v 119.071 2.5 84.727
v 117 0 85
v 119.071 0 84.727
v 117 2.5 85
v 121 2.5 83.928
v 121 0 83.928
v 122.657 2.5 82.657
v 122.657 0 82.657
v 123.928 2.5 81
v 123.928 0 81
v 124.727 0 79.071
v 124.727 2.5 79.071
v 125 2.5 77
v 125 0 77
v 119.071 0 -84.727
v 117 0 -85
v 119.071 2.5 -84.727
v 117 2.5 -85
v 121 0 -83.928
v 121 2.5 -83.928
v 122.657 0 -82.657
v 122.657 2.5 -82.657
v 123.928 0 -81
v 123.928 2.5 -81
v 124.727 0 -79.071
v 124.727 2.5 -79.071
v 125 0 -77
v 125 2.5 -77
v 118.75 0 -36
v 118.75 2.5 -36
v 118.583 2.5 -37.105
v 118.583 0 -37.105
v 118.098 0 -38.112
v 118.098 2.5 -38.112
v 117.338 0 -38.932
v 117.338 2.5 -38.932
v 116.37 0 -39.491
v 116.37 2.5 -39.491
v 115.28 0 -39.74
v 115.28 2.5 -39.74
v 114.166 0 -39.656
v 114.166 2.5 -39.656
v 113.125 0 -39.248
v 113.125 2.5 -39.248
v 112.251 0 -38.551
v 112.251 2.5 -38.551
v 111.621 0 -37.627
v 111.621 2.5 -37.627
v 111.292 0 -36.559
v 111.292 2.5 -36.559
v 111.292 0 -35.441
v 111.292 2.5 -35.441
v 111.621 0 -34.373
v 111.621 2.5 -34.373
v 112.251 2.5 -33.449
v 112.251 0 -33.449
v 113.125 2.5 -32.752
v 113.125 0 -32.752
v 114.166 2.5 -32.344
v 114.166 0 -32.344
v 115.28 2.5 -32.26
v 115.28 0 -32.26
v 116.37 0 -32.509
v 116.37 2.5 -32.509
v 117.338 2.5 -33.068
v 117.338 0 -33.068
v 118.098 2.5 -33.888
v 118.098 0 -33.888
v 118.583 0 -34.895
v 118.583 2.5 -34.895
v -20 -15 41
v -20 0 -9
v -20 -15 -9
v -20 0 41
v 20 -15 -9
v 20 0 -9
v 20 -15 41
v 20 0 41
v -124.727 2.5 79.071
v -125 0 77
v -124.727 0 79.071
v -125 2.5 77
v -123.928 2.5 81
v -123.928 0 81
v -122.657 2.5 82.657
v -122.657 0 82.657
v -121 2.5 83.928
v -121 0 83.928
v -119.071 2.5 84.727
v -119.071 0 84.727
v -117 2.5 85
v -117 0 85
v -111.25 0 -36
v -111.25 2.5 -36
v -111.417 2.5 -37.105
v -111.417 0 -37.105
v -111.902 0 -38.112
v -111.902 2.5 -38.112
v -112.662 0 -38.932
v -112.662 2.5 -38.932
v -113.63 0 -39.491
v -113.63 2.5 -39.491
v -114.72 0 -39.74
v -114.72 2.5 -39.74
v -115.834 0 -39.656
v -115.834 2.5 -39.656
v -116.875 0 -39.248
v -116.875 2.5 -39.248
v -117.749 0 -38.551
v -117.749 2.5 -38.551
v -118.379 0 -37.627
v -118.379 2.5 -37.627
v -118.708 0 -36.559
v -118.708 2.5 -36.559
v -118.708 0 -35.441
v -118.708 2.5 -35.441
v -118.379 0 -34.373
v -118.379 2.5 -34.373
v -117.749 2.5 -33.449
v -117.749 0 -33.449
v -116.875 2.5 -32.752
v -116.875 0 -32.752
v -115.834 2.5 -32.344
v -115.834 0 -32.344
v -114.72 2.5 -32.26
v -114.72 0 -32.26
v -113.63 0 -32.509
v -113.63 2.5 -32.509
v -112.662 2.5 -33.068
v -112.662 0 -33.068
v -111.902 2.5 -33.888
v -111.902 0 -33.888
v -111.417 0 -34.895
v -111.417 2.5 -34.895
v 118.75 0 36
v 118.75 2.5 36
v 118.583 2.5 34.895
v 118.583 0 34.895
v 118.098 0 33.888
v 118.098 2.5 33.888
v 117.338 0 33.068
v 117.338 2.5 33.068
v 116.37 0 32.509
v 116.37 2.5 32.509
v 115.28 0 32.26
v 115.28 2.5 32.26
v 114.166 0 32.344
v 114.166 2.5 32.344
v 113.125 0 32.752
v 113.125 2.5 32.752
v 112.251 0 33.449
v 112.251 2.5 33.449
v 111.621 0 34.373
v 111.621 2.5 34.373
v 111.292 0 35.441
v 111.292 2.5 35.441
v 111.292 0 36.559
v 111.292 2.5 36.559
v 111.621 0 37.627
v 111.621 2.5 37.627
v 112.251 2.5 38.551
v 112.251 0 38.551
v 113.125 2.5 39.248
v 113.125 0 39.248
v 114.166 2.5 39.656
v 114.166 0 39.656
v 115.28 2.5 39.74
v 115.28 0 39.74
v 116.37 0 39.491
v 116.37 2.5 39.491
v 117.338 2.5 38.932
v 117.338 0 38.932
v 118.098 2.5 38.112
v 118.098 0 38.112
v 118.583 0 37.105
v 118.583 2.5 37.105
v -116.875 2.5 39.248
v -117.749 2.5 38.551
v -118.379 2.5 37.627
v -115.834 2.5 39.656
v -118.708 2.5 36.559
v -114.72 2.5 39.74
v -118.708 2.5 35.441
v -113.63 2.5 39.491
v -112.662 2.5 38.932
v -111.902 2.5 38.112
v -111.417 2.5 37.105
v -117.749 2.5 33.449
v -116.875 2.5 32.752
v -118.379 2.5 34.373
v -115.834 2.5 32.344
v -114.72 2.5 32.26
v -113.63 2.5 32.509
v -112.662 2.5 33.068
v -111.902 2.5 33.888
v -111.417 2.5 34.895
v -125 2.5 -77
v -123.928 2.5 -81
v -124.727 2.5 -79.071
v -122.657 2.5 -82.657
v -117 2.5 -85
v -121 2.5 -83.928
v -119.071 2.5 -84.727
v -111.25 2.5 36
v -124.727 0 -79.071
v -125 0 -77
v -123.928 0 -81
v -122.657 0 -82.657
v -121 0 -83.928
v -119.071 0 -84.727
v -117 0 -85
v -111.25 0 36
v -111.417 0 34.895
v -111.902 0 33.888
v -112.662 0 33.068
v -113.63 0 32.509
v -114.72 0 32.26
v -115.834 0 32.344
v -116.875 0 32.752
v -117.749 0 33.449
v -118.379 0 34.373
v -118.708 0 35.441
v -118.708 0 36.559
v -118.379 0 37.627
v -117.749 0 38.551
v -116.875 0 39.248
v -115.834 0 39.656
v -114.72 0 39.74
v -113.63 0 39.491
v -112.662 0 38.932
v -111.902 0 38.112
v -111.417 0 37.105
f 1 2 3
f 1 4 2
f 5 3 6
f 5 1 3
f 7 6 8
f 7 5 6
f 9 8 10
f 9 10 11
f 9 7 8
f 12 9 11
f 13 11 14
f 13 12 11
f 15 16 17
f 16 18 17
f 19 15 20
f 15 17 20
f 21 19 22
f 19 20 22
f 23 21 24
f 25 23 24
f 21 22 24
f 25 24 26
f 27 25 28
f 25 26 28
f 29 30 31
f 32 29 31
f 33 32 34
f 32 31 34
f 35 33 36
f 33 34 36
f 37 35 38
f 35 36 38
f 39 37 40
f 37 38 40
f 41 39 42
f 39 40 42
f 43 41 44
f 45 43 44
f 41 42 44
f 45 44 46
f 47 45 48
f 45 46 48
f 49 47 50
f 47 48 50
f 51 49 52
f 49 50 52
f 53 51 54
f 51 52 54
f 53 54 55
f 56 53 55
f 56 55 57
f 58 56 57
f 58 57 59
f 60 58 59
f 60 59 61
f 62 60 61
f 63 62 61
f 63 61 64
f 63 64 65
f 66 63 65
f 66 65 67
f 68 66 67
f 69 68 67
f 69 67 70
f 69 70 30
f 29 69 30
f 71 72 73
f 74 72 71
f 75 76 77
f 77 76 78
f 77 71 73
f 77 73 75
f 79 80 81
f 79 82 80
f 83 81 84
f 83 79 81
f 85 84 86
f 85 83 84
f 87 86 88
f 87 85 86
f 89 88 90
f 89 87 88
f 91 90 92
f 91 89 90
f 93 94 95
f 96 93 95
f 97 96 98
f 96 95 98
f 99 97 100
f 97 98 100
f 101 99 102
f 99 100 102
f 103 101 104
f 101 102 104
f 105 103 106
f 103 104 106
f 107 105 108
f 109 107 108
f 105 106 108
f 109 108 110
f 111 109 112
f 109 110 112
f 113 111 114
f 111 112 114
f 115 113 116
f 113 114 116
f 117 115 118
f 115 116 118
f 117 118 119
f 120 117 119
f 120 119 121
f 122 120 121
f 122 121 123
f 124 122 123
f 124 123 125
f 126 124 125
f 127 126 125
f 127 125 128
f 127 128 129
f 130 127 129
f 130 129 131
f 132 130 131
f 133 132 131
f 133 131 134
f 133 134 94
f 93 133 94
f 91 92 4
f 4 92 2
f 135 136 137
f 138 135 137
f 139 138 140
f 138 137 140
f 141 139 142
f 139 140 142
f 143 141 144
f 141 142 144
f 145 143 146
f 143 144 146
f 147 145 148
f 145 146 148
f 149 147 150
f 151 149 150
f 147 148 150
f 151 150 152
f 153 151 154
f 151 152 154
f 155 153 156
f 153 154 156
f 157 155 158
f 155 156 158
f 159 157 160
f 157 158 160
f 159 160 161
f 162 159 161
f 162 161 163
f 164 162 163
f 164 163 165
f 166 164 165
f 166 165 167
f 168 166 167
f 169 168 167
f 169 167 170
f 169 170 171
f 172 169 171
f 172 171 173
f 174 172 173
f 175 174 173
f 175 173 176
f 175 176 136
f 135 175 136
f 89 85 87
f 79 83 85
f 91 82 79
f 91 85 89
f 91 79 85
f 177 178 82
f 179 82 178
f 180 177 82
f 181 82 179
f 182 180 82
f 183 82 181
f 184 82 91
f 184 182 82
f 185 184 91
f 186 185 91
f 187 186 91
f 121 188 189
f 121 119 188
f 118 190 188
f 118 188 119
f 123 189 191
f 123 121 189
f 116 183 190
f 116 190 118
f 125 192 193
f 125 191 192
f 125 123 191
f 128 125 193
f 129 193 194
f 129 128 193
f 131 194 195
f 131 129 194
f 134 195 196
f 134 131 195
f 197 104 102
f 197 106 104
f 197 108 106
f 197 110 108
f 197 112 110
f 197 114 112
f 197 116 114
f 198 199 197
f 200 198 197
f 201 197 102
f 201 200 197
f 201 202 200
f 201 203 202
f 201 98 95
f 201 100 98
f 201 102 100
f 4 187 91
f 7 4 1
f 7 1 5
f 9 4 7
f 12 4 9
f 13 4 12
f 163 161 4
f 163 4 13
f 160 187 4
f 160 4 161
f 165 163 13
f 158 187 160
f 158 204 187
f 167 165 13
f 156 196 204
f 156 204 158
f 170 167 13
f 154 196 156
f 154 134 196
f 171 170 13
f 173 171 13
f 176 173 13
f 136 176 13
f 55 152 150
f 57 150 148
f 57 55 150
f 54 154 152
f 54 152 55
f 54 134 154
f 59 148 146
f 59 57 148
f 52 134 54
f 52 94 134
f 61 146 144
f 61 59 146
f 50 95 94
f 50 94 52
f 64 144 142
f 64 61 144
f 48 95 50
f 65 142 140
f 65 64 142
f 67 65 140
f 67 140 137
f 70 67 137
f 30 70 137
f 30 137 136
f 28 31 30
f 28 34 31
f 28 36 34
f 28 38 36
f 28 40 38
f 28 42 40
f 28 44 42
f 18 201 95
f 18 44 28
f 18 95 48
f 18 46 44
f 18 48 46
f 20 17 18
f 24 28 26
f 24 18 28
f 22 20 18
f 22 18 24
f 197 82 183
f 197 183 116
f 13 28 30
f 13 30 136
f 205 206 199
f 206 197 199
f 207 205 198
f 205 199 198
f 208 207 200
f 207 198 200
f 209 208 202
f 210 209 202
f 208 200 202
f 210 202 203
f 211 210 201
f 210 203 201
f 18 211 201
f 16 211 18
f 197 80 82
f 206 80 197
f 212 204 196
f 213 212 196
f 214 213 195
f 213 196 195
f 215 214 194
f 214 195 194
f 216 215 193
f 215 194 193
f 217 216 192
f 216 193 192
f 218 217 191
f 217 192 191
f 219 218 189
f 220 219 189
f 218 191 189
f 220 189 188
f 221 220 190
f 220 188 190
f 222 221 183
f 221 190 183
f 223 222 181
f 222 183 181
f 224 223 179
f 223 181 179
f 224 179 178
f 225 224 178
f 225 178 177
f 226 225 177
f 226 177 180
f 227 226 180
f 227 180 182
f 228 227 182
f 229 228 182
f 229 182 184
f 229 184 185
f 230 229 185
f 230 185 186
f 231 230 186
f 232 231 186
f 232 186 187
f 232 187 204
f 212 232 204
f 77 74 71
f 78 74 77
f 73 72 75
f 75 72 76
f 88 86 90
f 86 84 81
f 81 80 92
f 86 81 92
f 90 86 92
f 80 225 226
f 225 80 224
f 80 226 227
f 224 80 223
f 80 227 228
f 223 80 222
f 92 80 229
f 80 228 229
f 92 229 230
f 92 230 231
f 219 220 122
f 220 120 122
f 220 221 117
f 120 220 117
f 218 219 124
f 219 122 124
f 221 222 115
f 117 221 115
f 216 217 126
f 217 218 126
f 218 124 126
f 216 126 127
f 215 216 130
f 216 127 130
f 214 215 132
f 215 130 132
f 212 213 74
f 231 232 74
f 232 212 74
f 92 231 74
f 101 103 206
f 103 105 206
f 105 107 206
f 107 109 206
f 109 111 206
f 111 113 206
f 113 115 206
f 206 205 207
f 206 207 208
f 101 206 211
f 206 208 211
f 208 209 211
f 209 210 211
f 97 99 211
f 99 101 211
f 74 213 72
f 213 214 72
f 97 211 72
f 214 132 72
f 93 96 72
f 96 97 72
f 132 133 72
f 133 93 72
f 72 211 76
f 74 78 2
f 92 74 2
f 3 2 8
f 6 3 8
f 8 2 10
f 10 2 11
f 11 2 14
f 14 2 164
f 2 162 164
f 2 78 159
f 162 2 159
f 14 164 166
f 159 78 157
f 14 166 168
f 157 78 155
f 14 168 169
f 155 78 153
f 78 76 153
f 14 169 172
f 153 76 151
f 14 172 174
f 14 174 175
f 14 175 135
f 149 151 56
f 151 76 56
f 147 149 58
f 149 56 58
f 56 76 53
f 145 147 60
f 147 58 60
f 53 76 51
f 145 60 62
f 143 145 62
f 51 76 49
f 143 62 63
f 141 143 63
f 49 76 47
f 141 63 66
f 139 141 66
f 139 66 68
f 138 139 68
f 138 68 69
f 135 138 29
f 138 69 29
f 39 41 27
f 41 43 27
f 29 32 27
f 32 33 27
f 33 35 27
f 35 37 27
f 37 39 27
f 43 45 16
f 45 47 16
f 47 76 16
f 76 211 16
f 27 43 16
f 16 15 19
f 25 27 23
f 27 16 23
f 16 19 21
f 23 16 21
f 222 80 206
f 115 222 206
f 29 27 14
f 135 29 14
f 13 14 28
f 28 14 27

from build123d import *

# Parameters (mm, degrees)
SKETCH1_W           = 250
SKETCH1_H           = 170
BOSS_EXTRUDE1_DEPTH = 2.5
SKETCH2_R           = 3.75
CUT_EXTRUDE1_DEPTH  = 3.5
FILLET1_R           = 8
SKETCH4_W           = 40
SKETCH4_H           = 50
BOSS_EXTRUDE2_DEPTH = 15


with BuildPart() as part:
    # Sketch1 → Boss-Extrude1 (new body)
    with BuildSketch(Plane(origin=(0, 0, 0), x_dir=(1, 0, 0), z_dir=(0, 1, 0))):
        Rectangle(SKETCH1_W, SKETCH1_H)
    extrude(amount=BOSS_EXTRUDE1_DEPTH)

    # Sketch2 → Cut-Extrude1 (cut, through all)
    with BuildSketch(Plane(origin=(0, 2.5, 0), x_dir=(1, 0, 0), z_dir=(0, 1, 0))):
        with Locations((-115, 36)):
            Circle(SKETCH2_R)
        with Locations((-115, -36)):
            Circle(SKETCH2_R)
        with Locations((115, -36)):
            Circle(SKETCH2_R)
        with Locations((115, 36)):
            Circle(SKETCH2_R)
    extrude(amount=-CUT_EXTRUDE1_DEPTH, mode=Mode.SUBTRACT)

    # Fillet1
    fillet1_edges = [part.edges().sort_by_distance(p)[0] for p in [
        (-125, 1.25, -85),
        (125, 1.25, -85),
        (125, 1.25, 85),
        (-125, 1.25, 85),
    ]]
    fillet(fillet1_edges, radius=FILLET1_R)

    # Sketch4 → Boss-Extrude2 (add)
    with BuildSketch(Plane.XZ):
        with Locations((0, 16)):
            Rectangle(SKETCH4_W, SKETCH4_H)
    extrude(amount=BOSS_EXTRUDE2_DEPTH)


solid = part.part
